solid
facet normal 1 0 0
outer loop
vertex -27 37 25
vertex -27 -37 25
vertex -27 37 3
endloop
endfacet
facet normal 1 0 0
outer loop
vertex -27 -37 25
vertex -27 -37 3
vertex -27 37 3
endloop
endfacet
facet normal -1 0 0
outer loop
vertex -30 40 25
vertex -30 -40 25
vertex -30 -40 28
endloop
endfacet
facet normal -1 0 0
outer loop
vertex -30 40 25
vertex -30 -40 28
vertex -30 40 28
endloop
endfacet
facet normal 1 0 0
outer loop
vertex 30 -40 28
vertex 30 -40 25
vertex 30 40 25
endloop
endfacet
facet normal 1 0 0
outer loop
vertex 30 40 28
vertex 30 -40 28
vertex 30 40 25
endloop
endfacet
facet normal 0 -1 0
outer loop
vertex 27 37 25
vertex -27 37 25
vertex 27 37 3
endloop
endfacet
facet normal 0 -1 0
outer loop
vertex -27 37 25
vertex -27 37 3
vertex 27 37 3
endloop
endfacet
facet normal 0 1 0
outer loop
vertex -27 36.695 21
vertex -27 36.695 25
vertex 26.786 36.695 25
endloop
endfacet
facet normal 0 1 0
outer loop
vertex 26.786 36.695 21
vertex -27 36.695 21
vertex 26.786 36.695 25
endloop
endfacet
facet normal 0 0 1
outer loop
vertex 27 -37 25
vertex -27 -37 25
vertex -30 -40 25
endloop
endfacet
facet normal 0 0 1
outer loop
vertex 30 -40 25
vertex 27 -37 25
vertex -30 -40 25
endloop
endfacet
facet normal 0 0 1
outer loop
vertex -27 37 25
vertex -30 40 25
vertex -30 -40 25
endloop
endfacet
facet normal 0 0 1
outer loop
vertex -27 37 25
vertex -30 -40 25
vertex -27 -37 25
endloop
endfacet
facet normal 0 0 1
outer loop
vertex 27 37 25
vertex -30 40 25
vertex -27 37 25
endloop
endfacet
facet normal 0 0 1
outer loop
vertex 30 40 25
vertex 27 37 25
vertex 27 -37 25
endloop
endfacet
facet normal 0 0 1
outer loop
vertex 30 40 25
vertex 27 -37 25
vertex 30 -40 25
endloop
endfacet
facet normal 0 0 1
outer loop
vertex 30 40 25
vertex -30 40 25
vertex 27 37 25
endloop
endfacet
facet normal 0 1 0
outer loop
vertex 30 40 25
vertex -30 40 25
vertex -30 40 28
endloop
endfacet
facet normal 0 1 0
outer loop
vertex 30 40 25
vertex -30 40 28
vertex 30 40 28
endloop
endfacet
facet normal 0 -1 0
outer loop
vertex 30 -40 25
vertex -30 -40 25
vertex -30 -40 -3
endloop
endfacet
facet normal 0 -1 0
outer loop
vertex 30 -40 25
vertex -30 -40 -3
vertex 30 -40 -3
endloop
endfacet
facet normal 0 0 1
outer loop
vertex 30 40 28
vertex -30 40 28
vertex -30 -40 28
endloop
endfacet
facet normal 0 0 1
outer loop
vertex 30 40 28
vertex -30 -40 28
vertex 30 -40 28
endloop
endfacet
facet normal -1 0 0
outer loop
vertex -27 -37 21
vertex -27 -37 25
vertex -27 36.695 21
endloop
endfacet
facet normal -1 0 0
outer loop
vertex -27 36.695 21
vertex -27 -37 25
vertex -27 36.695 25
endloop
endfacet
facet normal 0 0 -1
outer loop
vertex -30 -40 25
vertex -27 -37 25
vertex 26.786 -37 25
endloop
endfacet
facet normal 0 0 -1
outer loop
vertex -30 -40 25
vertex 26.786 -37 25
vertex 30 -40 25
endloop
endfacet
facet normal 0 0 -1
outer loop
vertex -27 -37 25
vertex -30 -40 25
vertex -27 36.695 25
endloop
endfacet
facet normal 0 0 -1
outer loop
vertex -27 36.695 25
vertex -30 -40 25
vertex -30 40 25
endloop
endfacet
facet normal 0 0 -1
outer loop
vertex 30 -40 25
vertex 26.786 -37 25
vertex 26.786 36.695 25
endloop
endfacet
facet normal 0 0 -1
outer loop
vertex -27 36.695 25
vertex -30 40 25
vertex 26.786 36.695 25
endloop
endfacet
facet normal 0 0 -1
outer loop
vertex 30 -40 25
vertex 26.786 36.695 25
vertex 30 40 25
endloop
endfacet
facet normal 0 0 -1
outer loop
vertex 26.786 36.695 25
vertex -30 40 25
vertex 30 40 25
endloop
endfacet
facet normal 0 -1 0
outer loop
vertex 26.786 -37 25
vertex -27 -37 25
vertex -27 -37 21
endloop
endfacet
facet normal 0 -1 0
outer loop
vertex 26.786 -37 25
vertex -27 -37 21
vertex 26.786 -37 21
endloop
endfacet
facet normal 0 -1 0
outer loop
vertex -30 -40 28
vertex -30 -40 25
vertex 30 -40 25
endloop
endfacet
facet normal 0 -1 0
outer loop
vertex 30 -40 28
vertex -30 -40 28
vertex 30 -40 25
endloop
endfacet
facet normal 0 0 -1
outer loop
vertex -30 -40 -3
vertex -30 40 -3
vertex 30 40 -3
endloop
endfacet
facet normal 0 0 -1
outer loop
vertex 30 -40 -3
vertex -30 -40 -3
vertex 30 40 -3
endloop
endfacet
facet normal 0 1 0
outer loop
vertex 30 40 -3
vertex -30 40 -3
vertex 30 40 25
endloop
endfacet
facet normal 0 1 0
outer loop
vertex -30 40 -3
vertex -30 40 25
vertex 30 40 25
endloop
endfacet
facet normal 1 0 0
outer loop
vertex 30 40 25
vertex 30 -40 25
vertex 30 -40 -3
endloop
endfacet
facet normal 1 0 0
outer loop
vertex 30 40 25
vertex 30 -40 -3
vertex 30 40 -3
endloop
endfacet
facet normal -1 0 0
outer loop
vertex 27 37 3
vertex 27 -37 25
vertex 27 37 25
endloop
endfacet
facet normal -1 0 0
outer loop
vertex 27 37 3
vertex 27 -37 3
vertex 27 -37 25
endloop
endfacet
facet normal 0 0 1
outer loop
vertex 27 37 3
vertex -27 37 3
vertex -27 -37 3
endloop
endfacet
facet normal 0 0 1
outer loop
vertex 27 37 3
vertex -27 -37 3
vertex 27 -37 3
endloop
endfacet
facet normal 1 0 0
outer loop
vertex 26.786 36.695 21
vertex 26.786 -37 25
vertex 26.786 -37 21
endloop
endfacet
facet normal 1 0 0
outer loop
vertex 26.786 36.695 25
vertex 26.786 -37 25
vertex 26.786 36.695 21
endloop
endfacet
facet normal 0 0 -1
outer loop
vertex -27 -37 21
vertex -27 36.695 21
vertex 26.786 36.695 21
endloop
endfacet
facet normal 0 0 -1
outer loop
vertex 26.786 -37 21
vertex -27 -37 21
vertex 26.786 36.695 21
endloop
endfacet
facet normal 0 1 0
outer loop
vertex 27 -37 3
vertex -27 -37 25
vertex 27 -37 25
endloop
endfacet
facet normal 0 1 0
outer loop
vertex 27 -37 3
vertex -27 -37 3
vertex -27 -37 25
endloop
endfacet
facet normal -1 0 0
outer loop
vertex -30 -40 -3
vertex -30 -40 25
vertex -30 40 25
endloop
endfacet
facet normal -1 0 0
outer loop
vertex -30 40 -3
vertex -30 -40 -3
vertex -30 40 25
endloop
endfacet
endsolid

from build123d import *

# Parameters (mm, degrees)
F0_W     = 60
F0_H     = 80
F1_DEPTH = 25
F2_T     = -3
F4_DEPTH = 3
F3_W     = 60
F3_H     = 80
F3_W_2   = 54
F3_H_2   = 74
F6_DEPTH = 3
F5_W     = 53.7855226994
F5_H     = 73.69507429
F7_DEPTH = 4


# Not quite as in the source:
# - the program builds the solid bodies; features that only make, move or delete a surface that nothing else refers to are left out


with BuildPart() as f1:
    # F0 (on Top) → F1 (new body)
    with BuildSketch(Plane.XY):
        Rectangle(F0_W, F0_H)
    extrude(amount=F1_DEPTH)

    # F2
    f2_openings = [f1.faces().sort_by_distance(p)[0] for p in [
        (0, 0, 25),
    ]]
    offset(amount=F2_T, openings=f2_openings)

    # F4 (add): a face of the model
    f4_faces = [f1.faces().sort_by_distance(p)[0] for p in [
        (0, 0, 0),
    ]]
    extrude(f4_faces, amount=F4_DEPTH)


with BuildPart() as f6:
    # F3 (on face) → F6 (new body)
    with BuildSketch(Plane.XY.offset(25)):
        Rectangle(F3_W, F3_H)
        Rectangle(F3_W_2, F3_H_2, mode=Mode.SUBTRACT)
        Rectangle(F3_W_2, F3_H_2)
    extrude(amount=F6_DEPTH)

    # F5 (on face) → F7 (join)
    with BuildSketch(Plane.XY.offset(25)):
        with Locations((-0.1072386503, -0.152462855)):
            Rectangle(F5_W, F5_H)
    extrude(amount=-F7_DEPTH)


solid = Compound([f1.part, f6.part])
